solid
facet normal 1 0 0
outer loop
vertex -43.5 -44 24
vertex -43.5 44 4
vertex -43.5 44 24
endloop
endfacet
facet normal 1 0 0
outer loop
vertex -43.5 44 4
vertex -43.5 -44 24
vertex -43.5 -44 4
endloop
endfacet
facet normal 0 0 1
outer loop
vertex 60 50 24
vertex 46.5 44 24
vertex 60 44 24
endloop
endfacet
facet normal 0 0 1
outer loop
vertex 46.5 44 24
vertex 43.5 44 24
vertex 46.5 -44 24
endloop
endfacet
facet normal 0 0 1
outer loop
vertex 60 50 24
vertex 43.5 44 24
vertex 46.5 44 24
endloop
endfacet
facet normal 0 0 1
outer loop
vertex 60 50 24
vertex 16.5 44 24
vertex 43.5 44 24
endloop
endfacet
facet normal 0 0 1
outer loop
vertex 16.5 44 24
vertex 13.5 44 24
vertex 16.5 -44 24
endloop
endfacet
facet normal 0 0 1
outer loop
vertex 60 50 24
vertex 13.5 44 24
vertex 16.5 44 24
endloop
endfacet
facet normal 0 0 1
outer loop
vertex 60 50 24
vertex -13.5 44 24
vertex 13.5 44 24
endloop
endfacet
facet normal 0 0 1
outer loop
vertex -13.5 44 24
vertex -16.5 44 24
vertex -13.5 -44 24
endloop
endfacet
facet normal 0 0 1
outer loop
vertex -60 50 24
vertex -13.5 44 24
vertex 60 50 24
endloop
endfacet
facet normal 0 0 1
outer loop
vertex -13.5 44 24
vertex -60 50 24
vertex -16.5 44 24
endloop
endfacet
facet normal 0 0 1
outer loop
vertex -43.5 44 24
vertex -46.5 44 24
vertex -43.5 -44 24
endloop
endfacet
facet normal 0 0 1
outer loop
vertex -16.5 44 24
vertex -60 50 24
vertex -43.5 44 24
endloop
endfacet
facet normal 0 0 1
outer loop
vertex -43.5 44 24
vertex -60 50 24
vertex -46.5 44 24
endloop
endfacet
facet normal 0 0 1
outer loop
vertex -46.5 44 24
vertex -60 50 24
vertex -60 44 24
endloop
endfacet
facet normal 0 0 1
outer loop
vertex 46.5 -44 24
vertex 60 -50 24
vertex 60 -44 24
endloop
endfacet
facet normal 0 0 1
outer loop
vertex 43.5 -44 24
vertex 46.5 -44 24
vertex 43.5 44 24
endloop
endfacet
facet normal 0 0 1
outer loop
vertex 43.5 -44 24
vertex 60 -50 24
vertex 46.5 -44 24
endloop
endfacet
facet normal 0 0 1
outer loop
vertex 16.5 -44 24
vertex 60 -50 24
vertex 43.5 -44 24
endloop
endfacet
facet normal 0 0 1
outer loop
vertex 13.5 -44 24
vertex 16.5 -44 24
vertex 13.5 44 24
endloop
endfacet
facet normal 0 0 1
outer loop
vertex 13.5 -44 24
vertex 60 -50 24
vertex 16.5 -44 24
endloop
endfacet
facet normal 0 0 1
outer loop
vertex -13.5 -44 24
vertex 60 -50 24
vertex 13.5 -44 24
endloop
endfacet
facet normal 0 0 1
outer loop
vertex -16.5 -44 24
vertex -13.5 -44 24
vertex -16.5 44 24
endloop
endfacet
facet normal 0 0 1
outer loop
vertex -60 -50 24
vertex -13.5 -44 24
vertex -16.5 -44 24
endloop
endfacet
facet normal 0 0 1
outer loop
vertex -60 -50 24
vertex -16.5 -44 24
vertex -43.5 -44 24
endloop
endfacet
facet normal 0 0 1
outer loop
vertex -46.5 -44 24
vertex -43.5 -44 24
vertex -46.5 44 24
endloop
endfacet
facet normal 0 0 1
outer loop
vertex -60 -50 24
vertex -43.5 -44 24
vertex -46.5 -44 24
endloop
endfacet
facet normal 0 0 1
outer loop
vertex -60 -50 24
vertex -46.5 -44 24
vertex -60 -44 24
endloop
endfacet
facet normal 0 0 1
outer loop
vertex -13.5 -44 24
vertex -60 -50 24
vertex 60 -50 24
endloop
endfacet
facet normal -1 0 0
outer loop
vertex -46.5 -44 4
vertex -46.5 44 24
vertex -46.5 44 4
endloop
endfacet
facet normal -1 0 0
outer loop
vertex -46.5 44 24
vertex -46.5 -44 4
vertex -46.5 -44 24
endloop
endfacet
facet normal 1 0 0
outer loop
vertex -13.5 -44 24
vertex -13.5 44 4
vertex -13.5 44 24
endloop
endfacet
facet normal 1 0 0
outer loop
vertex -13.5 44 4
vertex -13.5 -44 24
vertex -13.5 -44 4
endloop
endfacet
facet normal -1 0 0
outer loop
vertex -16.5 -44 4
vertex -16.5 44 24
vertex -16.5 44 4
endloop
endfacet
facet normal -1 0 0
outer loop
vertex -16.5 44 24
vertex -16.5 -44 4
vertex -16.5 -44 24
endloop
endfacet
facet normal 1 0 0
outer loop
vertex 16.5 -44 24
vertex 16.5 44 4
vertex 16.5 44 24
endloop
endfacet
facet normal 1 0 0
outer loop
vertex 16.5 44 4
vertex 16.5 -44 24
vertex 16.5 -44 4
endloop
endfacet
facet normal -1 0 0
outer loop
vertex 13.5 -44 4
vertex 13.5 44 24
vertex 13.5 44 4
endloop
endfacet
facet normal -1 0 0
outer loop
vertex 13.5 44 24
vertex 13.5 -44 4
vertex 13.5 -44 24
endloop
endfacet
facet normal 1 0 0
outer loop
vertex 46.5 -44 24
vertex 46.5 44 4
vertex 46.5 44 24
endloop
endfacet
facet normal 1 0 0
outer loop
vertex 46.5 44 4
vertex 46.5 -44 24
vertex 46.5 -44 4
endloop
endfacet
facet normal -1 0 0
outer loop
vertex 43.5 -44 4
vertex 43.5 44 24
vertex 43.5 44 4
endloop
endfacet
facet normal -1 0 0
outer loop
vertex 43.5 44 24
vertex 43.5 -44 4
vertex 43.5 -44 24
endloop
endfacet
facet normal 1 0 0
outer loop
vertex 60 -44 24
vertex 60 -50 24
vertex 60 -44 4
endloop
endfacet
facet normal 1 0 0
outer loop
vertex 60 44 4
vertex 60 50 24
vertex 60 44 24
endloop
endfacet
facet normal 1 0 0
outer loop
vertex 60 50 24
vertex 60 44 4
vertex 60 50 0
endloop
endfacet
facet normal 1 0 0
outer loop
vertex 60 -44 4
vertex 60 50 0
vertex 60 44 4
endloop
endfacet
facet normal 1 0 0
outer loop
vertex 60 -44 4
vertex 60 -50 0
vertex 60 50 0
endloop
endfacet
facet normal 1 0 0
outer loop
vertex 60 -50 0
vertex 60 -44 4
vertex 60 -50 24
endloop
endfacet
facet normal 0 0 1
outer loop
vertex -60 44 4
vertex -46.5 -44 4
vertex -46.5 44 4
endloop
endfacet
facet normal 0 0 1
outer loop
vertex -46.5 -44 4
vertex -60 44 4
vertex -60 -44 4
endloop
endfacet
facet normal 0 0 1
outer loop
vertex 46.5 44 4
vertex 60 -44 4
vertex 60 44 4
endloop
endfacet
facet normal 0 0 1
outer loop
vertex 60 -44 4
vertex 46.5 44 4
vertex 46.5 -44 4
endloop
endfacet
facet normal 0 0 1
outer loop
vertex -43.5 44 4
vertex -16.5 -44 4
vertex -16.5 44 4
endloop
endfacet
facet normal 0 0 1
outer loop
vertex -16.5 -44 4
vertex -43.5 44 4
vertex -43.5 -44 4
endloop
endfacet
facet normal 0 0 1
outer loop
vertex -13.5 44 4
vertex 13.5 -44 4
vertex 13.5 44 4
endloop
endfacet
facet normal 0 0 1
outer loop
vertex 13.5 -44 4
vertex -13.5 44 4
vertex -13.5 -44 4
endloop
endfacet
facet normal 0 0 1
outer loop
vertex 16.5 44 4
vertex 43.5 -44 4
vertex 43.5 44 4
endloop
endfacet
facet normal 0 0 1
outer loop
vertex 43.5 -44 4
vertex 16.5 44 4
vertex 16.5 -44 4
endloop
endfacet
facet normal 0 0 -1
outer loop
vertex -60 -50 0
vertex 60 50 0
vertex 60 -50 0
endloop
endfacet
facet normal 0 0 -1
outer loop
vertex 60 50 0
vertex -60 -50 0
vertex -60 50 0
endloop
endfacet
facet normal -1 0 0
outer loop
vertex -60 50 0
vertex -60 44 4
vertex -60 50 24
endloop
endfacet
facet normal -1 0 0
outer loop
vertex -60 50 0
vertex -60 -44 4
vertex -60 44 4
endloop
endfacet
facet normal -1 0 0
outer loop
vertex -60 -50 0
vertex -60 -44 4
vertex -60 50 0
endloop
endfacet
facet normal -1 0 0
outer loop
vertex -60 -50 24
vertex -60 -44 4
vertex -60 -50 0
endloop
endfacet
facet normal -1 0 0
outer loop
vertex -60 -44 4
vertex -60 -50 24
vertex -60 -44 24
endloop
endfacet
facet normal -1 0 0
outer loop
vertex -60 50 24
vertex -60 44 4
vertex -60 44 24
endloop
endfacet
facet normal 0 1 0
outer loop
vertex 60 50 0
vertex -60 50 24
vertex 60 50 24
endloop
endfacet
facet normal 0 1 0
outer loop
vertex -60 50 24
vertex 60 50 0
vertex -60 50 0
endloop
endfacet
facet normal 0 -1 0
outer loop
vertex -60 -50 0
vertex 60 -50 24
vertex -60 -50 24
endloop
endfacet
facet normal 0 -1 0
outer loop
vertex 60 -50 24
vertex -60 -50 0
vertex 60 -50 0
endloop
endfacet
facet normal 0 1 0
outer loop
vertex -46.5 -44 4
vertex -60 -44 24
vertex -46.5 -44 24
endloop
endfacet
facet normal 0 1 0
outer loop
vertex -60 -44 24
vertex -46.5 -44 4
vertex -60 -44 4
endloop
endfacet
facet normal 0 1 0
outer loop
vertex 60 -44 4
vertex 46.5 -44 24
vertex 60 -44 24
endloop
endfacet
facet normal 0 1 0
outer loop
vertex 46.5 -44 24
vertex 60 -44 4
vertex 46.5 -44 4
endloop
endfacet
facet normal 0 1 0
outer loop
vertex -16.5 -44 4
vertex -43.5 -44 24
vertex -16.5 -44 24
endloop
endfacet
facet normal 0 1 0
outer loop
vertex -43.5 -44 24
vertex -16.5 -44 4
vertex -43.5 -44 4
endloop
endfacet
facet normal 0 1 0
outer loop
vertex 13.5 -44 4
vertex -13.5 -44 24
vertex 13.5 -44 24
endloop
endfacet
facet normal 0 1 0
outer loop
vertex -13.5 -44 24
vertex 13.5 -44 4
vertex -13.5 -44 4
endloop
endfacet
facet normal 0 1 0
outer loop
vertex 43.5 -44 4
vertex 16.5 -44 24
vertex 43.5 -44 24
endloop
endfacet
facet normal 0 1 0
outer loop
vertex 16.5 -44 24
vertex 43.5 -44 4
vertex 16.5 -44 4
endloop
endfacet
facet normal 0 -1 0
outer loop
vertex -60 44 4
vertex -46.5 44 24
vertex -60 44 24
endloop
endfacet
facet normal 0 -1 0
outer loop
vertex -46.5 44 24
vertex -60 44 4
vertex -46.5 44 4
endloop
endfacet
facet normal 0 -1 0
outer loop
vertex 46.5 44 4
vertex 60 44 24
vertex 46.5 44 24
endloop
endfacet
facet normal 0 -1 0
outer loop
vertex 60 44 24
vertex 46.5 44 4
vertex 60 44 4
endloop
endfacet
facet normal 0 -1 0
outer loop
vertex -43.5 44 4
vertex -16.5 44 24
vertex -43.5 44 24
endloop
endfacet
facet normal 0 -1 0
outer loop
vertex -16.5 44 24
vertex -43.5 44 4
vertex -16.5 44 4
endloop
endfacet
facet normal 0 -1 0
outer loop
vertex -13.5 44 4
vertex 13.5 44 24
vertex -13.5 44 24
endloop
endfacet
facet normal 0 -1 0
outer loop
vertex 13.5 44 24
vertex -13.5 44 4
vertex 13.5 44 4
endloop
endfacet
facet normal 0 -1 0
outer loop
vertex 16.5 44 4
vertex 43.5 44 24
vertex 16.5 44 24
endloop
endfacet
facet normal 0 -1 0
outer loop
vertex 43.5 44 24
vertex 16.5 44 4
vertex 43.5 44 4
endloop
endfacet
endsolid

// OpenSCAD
$fn = 32;

// ----------------------------------------------------------------------
// Rib frame 120 x 100 x 24
// 4 ribs at 30 mm pitch
// ----------------------------------------------------------------------

// --- parameters (mm) ---
frame = [120, 100, 4];  // base plate size (x, y, z)
rail_w = 6;             // side rail width
ribs = 4;               // number of ribs
rib_t = 3;              // rib thickness
rib_h = 20;             // rib height above the base plate
pitch = 30;             // pitch between rib centres

// --- derived feature positions (mm) ---
span = (ribs - 1) * pitch;          // = 90   distance between the outer ribs
origin_x = -span / 2;               // = -45   X of the first rib
rib_len = frame[1] - 2 * rail_w + 2;  // = 90   rib length, 1 mm into each rail
feature_centers = [
  [origin_x + 0 * pitch, 0],
  [origin_x + 1 * pitch, 0],
  [origin_x + 2 * pitch, 0],
  [origin_x + 3 * pitch, 0]
];   // rib centre line, drives the rib loop

// base plate, two side rails, then the ribs read straight off feature_centers
union() {
  translate([-frame[0] / 2, -frame[1] / 2, 0]) cube(frame);
  translate([-frame[0] / 2, -frame[1] / 2, 0]) cube([frame[0], rail_w, frame[2] + rib_h]);
  translate([-frame[0] / 2, frame[1] / 2 - rail_w, 0]) cube([frame[0], rail_w, frame[2] + rib_h]);
  for (centre = feature_centers)
    translate([centre[0] - rib_t / 2, centre[1] - rib_len / 2, frame[2] - 1])
      cube([rib_t, rib_len, rib_h + 1]);
}
